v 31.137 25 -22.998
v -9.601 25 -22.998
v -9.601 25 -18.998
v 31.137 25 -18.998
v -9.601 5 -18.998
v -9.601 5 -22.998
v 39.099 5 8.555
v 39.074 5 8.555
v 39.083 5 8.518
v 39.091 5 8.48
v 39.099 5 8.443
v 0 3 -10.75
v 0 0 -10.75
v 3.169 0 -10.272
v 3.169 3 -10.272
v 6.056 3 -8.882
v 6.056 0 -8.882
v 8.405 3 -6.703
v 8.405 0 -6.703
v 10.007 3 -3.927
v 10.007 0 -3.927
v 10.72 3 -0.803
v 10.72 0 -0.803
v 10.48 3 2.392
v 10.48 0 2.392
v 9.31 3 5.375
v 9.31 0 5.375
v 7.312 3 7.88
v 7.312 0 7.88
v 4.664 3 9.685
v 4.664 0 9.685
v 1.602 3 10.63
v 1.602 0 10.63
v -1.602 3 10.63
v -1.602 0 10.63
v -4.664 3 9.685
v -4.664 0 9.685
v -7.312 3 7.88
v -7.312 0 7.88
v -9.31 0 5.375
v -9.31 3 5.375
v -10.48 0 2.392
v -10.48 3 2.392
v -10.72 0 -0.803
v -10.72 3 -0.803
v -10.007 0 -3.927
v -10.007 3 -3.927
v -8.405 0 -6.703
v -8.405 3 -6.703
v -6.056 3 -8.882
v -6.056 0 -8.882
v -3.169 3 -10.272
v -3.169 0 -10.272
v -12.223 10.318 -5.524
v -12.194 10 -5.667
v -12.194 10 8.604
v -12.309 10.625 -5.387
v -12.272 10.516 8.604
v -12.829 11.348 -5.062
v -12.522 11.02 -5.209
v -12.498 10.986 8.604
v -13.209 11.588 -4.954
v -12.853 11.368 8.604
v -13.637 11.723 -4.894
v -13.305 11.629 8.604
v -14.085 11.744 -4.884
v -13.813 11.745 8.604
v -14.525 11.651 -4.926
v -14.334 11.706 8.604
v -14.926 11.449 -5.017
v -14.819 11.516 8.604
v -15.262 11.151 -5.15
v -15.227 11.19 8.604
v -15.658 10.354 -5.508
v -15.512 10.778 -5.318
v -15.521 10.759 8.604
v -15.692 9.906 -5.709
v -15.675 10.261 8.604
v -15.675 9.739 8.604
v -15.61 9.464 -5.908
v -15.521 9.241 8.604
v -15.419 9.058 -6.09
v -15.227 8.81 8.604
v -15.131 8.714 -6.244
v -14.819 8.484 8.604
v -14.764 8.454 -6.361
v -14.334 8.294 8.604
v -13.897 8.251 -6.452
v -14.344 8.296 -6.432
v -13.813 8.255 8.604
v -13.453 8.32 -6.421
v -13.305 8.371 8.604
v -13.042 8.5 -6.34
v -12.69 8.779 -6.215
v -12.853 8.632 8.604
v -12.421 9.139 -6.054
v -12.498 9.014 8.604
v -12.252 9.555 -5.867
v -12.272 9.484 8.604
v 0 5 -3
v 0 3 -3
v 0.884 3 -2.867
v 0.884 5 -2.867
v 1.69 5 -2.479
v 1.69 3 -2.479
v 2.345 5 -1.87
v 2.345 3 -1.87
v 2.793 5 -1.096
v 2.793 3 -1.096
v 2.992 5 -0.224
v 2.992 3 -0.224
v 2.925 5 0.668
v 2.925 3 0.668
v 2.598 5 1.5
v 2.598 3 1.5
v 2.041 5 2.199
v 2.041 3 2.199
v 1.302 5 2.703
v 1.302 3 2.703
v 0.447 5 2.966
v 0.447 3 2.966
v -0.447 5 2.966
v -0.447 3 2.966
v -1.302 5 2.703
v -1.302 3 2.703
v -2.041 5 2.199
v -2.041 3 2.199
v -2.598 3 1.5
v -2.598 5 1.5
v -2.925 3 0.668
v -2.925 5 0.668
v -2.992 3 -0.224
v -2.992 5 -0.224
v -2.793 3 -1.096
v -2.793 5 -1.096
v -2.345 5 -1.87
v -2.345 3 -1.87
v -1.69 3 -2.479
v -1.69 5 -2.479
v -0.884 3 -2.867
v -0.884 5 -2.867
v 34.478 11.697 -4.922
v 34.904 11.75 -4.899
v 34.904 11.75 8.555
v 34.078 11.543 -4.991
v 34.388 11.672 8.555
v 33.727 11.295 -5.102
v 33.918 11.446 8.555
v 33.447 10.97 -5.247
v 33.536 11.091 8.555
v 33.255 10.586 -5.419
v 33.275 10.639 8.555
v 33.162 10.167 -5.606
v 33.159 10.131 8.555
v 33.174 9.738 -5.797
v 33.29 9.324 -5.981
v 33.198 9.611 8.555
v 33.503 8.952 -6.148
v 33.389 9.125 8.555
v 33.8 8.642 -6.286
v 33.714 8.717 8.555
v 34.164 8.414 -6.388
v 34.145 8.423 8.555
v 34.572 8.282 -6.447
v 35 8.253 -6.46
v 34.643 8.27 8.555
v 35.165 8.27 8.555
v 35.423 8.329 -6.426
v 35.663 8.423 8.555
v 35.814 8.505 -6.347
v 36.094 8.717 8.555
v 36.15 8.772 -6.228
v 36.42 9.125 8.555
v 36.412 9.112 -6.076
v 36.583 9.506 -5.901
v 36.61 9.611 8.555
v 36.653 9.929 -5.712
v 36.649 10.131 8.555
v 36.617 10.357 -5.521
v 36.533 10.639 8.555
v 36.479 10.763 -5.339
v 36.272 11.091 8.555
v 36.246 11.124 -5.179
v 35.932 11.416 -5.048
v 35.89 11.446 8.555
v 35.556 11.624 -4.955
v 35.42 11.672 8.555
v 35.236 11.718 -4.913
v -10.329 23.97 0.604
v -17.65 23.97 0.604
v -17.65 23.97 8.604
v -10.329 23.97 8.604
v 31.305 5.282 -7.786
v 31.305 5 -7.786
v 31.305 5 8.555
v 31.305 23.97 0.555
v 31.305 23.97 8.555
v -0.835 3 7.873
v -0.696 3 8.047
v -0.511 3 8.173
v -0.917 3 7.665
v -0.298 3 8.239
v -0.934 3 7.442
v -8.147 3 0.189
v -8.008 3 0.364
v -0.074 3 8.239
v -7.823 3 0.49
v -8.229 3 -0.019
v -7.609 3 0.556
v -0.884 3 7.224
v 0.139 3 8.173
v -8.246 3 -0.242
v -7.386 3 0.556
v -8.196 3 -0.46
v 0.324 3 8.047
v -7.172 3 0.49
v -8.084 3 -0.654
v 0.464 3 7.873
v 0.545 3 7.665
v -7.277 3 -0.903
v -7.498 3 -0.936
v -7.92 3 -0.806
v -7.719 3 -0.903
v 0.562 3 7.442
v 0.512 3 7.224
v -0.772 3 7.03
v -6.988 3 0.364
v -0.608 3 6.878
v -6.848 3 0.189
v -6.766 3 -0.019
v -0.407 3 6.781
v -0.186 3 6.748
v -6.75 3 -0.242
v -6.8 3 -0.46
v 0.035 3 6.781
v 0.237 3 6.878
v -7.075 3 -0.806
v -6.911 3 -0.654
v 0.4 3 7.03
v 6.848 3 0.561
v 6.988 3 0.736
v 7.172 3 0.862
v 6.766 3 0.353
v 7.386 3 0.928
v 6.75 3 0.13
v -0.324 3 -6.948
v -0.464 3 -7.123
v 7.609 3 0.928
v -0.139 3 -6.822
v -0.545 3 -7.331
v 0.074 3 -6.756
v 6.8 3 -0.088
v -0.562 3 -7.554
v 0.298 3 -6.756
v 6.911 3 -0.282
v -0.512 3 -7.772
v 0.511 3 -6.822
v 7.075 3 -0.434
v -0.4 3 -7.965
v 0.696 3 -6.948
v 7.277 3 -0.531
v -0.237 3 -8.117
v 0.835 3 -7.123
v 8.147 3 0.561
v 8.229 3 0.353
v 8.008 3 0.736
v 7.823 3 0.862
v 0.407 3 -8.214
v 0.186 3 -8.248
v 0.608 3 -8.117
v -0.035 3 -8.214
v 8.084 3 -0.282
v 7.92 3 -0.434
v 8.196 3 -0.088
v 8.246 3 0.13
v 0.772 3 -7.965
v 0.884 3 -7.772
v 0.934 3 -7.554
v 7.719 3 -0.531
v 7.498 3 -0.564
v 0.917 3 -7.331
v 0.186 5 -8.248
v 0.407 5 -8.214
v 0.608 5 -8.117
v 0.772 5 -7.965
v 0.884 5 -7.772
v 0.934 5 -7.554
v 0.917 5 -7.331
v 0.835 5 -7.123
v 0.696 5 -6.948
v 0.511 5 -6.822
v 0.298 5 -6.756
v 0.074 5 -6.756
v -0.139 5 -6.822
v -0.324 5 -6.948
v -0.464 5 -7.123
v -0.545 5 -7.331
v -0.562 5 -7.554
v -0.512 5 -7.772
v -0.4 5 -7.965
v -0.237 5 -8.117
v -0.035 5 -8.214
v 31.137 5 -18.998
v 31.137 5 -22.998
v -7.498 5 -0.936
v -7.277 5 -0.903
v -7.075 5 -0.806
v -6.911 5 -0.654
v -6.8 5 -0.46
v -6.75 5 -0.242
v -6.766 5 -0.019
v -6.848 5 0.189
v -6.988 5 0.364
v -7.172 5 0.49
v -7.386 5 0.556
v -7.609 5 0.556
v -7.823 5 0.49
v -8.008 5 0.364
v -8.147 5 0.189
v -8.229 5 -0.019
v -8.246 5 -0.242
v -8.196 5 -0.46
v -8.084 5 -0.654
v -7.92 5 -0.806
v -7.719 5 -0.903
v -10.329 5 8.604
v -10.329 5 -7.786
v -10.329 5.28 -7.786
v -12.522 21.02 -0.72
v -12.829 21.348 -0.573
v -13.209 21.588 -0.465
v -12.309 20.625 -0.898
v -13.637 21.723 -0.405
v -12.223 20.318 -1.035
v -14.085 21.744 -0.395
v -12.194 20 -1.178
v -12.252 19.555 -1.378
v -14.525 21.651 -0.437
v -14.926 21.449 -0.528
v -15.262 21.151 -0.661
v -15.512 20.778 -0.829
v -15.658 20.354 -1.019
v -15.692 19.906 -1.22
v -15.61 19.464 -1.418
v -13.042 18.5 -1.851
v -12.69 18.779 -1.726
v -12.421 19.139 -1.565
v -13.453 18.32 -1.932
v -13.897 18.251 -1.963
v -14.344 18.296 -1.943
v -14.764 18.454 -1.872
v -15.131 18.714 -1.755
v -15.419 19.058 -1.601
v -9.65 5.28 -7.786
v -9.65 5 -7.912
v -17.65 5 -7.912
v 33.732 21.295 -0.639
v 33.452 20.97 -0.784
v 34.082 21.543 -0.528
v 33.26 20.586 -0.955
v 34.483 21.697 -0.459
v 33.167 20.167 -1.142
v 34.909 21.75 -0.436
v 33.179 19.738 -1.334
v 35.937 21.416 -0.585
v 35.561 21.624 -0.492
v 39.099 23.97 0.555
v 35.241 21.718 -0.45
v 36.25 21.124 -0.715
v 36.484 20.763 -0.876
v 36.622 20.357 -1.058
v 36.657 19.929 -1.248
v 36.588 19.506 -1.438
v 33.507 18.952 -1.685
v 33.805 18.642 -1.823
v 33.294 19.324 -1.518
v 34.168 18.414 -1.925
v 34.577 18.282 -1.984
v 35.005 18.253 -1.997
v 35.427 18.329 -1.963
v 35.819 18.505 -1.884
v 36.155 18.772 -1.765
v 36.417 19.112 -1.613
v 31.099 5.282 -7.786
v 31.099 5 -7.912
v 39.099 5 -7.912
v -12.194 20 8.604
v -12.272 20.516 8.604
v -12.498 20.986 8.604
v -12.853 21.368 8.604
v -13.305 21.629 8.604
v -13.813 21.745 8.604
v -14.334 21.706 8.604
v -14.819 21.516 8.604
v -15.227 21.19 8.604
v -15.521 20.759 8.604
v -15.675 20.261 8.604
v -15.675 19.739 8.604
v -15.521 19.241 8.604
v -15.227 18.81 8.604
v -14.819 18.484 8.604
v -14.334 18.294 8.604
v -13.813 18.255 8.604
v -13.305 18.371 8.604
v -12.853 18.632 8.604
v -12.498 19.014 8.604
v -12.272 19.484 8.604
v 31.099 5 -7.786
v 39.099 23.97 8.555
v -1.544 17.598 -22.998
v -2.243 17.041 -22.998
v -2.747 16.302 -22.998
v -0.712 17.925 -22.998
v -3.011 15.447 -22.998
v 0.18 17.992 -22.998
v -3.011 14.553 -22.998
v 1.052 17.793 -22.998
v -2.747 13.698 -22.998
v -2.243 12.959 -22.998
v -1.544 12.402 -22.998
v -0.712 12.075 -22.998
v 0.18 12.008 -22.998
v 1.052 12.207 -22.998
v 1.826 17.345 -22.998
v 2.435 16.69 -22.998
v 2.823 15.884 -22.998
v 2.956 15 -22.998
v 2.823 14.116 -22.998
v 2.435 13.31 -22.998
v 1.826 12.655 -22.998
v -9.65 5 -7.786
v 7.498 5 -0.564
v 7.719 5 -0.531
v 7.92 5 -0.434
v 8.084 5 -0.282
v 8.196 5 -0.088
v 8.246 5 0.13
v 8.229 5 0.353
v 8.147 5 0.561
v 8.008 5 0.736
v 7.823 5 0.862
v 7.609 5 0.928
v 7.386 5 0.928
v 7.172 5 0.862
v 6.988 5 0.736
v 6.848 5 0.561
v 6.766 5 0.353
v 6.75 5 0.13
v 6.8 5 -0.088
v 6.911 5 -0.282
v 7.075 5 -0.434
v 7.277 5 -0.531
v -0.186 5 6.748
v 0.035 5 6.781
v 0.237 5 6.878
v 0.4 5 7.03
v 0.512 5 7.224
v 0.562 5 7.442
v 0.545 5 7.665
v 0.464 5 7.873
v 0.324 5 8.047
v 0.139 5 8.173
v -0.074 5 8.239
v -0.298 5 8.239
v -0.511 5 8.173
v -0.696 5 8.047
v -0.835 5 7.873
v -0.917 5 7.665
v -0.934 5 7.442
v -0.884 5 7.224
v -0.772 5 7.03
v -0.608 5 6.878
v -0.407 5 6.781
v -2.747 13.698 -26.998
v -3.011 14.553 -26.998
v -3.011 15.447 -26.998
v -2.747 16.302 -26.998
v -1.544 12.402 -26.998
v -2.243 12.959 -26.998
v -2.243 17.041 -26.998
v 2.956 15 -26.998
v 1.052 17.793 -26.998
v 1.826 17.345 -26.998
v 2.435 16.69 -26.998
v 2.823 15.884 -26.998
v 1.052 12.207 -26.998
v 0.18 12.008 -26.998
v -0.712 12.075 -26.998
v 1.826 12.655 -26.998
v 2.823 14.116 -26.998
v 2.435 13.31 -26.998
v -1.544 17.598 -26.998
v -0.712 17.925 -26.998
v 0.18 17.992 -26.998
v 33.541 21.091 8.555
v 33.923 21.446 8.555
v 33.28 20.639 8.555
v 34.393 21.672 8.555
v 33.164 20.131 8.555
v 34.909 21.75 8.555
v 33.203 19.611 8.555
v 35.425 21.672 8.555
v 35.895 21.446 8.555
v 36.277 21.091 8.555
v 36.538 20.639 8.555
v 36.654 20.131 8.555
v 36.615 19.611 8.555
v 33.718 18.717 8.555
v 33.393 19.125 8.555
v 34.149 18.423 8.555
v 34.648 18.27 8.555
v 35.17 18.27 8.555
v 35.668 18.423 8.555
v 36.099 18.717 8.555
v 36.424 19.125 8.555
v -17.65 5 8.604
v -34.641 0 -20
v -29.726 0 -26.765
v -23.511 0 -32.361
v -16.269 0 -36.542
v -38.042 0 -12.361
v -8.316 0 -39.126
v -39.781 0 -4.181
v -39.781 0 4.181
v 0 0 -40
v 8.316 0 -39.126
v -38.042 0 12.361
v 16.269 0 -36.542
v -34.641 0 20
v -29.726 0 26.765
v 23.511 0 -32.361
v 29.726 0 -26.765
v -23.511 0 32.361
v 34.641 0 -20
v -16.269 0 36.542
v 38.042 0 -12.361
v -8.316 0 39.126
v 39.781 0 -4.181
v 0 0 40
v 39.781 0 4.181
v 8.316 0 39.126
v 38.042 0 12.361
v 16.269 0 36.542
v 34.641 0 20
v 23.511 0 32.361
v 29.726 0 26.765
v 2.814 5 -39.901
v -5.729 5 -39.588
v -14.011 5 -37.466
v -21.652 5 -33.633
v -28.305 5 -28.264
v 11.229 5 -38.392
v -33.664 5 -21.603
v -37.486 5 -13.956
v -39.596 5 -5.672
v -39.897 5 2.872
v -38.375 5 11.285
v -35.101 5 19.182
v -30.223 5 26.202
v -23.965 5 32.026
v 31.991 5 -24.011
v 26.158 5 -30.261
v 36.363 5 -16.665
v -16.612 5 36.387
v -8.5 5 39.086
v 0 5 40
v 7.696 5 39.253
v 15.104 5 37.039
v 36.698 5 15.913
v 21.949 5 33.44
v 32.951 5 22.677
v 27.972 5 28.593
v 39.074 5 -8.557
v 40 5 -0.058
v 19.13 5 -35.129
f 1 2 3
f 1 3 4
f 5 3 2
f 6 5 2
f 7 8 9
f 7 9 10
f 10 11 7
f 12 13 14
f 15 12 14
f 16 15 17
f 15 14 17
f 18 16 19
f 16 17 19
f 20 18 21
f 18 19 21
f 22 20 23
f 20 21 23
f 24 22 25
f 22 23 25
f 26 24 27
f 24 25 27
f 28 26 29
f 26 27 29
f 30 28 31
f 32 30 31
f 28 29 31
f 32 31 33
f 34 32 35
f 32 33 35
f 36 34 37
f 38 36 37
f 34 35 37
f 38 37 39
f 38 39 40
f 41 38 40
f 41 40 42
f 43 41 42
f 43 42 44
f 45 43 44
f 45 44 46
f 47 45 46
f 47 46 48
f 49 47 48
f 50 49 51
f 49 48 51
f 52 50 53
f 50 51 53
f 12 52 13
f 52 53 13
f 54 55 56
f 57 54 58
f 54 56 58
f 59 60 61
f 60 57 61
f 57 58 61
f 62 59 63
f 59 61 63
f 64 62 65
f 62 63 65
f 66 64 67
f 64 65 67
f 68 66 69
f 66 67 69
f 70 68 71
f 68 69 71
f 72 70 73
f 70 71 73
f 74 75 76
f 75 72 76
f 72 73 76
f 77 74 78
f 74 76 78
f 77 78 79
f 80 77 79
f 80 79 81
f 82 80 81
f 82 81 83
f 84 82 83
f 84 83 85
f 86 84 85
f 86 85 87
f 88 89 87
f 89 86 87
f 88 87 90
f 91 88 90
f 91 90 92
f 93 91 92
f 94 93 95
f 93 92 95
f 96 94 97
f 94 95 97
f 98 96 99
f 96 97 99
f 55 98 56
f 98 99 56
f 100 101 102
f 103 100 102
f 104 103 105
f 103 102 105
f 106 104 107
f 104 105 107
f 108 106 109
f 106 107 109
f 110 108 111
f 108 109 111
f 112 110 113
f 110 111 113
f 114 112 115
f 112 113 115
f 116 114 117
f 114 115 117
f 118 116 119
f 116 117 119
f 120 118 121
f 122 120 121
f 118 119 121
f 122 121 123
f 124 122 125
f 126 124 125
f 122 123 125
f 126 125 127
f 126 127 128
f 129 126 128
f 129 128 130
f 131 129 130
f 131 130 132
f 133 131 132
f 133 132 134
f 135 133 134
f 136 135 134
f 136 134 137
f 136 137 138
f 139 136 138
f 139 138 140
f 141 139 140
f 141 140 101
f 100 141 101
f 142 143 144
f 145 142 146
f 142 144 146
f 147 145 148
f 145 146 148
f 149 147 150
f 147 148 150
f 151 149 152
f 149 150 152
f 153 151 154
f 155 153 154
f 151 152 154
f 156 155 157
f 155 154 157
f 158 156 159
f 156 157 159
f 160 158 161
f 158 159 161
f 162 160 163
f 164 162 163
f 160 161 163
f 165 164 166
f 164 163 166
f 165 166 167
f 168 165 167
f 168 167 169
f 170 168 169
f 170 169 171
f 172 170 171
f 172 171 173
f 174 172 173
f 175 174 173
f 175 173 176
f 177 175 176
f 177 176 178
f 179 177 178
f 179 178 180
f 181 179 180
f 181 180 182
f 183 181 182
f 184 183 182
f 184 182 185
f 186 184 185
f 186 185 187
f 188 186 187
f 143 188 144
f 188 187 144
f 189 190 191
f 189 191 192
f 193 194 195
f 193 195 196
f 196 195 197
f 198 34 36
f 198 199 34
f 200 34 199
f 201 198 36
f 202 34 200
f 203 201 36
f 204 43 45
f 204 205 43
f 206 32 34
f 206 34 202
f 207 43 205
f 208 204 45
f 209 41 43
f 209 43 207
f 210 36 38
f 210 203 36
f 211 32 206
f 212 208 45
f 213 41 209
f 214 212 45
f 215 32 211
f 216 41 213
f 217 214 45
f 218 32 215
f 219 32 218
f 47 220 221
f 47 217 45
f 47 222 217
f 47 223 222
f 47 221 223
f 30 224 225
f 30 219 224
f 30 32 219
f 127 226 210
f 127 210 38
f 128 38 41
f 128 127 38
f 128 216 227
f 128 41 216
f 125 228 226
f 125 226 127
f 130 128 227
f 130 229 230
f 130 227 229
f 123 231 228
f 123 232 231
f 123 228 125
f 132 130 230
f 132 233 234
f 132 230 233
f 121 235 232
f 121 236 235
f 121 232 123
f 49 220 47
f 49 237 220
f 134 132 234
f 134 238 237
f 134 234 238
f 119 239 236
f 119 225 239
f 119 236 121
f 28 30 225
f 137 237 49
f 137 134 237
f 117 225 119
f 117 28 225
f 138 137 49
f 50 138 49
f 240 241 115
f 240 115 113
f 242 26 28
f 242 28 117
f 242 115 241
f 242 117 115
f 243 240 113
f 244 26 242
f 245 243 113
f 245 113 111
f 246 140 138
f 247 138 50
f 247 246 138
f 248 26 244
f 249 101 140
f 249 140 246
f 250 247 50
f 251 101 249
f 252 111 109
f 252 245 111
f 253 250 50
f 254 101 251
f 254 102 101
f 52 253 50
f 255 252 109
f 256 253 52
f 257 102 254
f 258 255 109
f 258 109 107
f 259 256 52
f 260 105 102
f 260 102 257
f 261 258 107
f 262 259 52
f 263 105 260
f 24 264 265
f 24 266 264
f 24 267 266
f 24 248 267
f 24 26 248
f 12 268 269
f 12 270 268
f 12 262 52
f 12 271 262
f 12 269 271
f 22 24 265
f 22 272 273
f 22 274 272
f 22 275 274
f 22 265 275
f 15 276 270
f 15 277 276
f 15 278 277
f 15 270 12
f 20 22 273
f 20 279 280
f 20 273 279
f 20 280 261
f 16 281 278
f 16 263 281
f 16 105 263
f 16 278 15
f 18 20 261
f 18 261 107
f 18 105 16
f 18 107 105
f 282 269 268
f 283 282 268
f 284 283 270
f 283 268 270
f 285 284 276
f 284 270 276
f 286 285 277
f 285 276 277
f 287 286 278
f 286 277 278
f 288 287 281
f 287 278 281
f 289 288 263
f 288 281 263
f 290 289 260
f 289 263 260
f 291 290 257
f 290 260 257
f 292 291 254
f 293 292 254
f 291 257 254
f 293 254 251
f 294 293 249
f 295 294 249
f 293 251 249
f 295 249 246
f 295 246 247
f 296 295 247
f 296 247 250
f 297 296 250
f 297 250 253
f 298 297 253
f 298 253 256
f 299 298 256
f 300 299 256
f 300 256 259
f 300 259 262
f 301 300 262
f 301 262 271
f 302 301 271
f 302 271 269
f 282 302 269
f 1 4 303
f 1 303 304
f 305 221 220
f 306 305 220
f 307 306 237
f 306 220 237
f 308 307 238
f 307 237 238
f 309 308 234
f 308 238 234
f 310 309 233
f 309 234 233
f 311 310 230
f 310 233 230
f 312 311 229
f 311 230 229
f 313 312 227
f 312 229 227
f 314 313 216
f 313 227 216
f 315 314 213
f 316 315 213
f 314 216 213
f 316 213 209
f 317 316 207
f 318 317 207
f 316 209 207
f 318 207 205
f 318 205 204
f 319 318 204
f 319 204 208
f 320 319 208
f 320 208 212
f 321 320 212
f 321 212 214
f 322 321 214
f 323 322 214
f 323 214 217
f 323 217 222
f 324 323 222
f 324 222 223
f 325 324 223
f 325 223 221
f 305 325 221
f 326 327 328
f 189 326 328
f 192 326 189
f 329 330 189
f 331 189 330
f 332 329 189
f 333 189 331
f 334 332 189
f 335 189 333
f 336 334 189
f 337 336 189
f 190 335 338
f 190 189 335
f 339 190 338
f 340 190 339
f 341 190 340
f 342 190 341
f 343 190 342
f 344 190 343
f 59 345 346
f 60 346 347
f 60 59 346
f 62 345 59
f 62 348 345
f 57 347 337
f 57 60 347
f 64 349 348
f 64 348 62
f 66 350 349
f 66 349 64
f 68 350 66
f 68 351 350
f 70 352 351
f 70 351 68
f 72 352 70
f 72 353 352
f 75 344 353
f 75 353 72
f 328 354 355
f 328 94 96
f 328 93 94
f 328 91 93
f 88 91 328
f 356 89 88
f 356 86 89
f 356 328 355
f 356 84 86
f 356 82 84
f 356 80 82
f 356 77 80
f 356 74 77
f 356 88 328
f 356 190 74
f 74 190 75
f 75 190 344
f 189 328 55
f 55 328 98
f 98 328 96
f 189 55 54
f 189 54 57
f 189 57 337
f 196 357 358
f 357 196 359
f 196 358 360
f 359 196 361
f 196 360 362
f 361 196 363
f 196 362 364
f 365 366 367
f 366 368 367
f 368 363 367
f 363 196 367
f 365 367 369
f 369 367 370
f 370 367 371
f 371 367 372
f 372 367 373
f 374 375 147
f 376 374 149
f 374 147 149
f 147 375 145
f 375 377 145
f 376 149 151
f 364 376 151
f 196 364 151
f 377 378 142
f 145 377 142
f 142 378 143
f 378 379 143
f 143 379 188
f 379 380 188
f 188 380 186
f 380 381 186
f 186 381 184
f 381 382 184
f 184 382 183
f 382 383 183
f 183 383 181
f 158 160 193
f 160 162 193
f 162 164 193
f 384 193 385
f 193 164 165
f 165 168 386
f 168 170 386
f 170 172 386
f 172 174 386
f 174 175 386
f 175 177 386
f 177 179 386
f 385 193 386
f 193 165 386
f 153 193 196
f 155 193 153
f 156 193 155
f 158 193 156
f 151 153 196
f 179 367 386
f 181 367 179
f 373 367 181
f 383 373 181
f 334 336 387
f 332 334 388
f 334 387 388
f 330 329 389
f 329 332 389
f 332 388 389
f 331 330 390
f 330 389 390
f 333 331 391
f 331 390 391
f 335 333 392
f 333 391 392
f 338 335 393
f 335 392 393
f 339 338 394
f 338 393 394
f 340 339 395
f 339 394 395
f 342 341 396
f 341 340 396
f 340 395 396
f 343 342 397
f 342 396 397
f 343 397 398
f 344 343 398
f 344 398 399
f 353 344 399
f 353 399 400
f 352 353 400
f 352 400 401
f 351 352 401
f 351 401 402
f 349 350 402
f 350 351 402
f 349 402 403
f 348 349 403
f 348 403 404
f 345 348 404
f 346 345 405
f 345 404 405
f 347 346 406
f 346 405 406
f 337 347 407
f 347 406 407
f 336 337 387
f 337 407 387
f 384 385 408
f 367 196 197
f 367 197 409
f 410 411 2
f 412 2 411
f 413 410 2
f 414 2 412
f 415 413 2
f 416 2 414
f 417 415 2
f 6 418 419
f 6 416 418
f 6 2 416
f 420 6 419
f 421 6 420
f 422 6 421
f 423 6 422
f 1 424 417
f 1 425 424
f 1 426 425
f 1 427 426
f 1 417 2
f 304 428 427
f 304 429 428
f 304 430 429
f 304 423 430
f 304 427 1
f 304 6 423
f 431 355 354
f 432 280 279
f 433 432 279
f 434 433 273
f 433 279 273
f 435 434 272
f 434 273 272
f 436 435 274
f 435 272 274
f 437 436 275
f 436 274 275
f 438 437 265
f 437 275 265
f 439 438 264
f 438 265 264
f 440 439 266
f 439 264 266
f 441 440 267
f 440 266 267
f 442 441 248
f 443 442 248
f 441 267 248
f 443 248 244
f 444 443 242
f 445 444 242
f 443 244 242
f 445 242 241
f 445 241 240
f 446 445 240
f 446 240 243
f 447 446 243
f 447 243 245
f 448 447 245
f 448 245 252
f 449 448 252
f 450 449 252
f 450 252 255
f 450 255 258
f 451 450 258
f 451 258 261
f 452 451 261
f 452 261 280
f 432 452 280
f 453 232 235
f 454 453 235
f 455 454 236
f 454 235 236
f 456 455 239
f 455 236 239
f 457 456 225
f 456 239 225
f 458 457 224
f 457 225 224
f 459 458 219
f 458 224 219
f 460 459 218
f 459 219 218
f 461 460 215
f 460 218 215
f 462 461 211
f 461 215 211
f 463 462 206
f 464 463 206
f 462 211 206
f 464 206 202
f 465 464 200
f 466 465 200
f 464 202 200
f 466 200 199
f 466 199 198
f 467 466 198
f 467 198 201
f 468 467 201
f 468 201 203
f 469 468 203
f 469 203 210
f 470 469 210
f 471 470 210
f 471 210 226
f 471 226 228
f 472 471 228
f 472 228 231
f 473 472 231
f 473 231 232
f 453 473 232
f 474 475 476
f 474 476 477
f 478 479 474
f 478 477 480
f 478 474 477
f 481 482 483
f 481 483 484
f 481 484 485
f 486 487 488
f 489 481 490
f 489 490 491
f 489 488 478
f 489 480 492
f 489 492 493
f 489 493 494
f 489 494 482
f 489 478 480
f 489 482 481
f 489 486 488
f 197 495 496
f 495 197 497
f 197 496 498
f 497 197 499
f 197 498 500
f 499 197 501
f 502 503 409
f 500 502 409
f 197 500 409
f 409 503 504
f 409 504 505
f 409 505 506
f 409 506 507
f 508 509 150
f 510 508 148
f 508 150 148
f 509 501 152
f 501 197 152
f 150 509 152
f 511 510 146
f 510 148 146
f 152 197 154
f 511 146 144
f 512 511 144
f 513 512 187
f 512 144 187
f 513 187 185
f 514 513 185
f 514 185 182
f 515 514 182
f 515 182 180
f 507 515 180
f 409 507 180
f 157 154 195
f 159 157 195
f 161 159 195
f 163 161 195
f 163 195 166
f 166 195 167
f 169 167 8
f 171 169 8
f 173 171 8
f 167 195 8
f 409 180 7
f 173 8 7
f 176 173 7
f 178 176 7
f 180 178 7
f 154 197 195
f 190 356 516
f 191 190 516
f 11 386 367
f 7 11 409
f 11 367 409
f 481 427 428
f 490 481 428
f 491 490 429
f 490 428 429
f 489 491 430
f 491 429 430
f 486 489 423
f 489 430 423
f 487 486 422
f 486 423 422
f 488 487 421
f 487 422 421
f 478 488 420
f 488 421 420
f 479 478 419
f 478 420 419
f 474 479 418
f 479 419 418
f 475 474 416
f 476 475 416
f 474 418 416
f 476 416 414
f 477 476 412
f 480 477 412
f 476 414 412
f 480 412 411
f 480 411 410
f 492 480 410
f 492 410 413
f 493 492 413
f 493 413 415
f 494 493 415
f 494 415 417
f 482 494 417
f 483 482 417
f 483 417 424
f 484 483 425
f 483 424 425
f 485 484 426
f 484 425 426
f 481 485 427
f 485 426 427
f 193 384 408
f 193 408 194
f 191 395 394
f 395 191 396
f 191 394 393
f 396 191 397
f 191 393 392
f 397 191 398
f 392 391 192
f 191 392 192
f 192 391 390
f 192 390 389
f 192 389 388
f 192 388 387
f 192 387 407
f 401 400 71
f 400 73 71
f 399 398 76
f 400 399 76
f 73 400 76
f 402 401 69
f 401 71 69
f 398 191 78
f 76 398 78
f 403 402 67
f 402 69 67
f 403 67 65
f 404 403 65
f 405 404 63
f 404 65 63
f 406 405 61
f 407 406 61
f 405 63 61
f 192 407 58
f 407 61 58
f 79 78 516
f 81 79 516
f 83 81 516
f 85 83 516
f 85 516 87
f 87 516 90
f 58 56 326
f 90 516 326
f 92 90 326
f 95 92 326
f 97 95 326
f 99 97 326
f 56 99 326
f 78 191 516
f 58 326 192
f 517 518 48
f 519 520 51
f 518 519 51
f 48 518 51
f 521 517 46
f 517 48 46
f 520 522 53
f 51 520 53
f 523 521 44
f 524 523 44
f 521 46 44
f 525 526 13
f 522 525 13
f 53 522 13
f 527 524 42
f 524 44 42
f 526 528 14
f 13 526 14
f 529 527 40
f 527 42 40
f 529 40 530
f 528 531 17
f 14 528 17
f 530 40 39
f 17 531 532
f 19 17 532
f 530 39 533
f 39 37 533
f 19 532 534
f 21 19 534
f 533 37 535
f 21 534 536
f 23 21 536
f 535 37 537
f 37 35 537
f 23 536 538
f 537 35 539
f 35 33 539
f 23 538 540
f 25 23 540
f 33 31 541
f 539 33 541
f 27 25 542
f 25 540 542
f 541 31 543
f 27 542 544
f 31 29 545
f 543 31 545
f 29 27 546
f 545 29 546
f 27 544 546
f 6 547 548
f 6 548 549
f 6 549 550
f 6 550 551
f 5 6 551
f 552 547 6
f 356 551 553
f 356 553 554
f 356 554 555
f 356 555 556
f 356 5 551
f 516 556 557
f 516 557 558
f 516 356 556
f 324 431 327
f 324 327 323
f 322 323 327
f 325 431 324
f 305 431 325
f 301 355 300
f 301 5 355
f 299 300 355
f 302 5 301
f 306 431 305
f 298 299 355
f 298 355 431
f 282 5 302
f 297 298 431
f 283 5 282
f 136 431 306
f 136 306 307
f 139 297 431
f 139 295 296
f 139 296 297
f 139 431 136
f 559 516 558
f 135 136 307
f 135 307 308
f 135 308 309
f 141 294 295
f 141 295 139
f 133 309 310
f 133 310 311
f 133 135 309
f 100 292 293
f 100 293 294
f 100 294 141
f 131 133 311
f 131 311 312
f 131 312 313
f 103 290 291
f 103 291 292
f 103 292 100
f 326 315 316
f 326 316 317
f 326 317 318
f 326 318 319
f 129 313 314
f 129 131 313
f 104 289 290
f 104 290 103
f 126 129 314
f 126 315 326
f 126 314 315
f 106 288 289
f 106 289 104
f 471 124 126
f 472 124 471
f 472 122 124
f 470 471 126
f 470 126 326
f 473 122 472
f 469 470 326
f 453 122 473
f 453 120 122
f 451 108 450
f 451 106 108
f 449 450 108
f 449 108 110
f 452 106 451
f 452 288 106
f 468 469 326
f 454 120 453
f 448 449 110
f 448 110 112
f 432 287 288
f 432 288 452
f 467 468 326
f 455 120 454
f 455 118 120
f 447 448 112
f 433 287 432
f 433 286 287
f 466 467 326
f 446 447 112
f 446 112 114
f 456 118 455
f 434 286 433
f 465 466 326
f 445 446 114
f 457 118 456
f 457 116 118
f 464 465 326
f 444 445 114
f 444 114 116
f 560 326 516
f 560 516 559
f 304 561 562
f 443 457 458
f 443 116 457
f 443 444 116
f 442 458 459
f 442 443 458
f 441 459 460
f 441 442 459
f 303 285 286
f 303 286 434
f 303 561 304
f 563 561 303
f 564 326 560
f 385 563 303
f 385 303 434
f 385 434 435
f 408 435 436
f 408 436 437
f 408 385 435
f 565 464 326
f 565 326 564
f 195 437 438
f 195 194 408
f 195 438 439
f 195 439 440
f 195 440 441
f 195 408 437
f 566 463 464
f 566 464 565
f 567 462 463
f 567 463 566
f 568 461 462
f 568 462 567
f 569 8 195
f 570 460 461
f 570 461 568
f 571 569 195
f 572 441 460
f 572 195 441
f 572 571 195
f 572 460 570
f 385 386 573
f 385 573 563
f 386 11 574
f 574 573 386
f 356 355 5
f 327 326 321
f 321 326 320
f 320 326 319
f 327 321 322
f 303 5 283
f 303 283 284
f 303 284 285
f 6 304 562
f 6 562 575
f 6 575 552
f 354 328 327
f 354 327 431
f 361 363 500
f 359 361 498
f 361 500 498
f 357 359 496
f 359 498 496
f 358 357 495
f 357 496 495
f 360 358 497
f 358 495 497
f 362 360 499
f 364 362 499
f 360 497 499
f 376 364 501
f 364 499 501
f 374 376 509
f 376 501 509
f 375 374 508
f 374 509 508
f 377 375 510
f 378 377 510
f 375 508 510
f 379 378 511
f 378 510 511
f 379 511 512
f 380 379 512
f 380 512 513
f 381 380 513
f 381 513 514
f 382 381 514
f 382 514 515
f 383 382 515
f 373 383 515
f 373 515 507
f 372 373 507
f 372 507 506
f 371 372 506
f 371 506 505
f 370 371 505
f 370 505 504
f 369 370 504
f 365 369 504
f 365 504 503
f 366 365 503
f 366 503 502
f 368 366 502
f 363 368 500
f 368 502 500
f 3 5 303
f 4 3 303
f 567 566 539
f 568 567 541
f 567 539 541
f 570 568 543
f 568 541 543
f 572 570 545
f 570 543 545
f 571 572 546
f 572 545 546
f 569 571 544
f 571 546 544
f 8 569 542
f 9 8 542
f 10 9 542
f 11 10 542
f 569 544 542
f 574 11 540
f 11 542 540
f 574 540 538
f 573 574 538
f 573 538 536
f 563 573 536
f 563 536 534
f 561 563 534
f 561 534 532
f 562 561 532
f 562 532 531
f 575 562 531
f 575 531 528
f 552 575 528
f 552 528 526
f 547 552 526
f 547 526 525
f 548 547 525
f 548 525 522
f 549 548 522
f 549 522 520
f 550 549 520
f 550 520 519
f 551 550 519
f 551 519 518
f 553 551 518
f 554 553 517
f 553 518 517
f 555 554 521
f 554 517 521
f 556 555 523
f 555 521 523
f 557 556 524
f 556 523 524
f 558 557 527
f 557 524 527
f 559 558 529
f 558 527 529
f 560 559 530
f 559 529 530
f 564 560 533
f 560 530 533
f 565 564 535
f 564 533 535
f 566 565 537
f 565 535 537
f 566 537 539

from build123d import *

# Parameters (mm, degrees)
SKIZZE1_R                       = 40
AUFSATZ_LINEAR_AUSTRAGEN1_DEPTH = 5
SKIZZE2_R                       = 10.75
SCHNITT_LINEAR_AUSTRAGEN1_DEPTH = 3
SKIZZE3_R                       = 3
SKIZZE3_R_2                     = 0.75
SCHNITT_LINEAR_AUSTRAGEN2_DEPTH = 13
SKIZZE4_W                       = 8
SKIZZE4_H                       = 8
AUFSATZ_LINEAR_AUSTRAGEN2_DEPTH = 18.97
AUFSATZ_LINEAR_AUSTRAGEN3_DEPTH = 8
AUFSATZ_LINEAR_AUSTRAGEN4_DEPTH = 8
SKIZZE7_R                       = 1.75
SCHNITT_LINEAR_AUSTRAGEN3_DEPTH = 33.27
SKIZZE9_W                       = 40.738044429
SKIZZE9_H                       = 4
AUFSATZ_LINEAR_AUSTRAGEN5_DEPTH = 20
SKIZZE10_R                      = 3
AUFSATZ_LINEAR_AUSTRAGEN6_DEPTH = 4
SKIZZE11_W                      = 0.727428481
SKIZZE11_H                      = 19.15
SKIZZE11_W_2                    = 0.206337284
SCHNITT_LINEAR_AUSTRAGEN4_DEPTH = 16.39


with BuildPart() as part:
    # Skizze1 → Aufsatz-Linear austragen1 (new body)
    with BuildSketch(Plane(origin=(0, 0, 0), x_dir=(1, 0, 0), z_dir=(0, 1, 0))):
        with Locations(Location((0, 0, 0), (0, 0, 270))):
            Circle(SKIZZE1_R)
    extrude(amount=AUFSATZ_LINEAR_AUSTRAGEN1_DEPTH)

    # Skizze2 → Schnitt-Linear austragen1 (cut)
    with BuildSketch(Plane.XZ):
        with Locations(Location((0, 0, 0), (0, 0, 270))):
            Circle(SKIZZE2_R)
    extrude(amount=-SCHNITT_LINEAR_AUSTRAGEN1_DEPTH, mode=Mode.SUBTRACT)

    # Skizze3 → Schnitt-Linear austragen2 (cut)
    with BuildSketch(Plane.XZ):
        with Locations(Location((0, 0, 0), (0, 0, 270))):
            Circle(SKIZZE3_R)
        with Locations(Location((-0.185951444, 7.49769445, 0), (0, 0, 270))):
            Circle(SKIZZE3_R_2)
        with Locations(Location((7.49769445, 0.185951444, 0), (0, 0, 270))):
            Circle(SKIZZE3_R_2)
        with Locations(Location((0.185951444, -7.49769445, 0), (0, 0, 270))):
            Circle(SKIZZE3_R_2)
        with Locations(Location((-7.49769445, -0.185951444, 0), (0, 0, 270))):
            Circle(SKIZZE3_R_2)
    extrude(amount=-SCHNITT_LINEAR_AUSTRAGEN2_DEPTH, mode=Mode.SUBTRACT)

    # Skizze4 → Aufsatz-Linear austragen2 (add)
    with BuildSketch(Plane(origin=(0, 5, 0), x_dir=(1, 0, 0), z_dir=(0, 1, 0))):
        with Locations((-13.649547585, -4.604184577)):
            Rectangle(SKIZZE4_W, SKIZZE4_H)
        with Locations((35.098787181, -4.555000776)):
            Rectangle(SKIZZE4_W, SKIZZE4_H)
    extrude(amount=AUFSATZ_LINEAR_AUSTRAGEN2_DEPTH)

    # Skizze5 → Aufsatz-Linear austragen3 (add)
    with BuildSketch(Plane(origin=(39.098787181, 0, 0), x_dir=(0, 0, -1), z_dir=(1, 0, 0))):
        Polygon((-0.555000776, 23.97), (7.911534589, 5), (-0.555000776, 5), align=None)
    extrude(amount=-AUFSATZ_LINEAR_AUSTRAGEN3_DEPTH)

    # Skizze6 → Aufsatz-Linear austragen4 (add)
    with BuildSketch(Plane.ZY.offset(17.649547585)):
        Polygon((0.604184577, 23.97), (-7.911534589, 5), (0.604184577, 5), align=None)
    extrude(amount=-AUFSATZ_LINEAR_AUSTRAGEN4_DEPTH)

    # Skizze7 → Schnitt-Linear austragen3 (cut)
    with BuildSketch(Plane.XY.offset(8.604184577)):
        with Locations((-13.944175516, 20)):
            Circle(SKIZZE7_R)
        with Locations((-13.944175516, 10)):
            Circle(SKIZZE7_R)
        with Locations(Location((34.90415925, 10, 0), (0, 0, 90))):
            Circle(SKIZZE7_R)
        with Locations(Location((34.908787181, 20, 0), (0, 0, 90))):
            Circle(SKIZZE7_R)
    extrude(amount=-SCHNITT_LINEAR_AUSTRAGEN3_DEPTH, mode=Mode.SUBTRACT)

    # Skizze9 → Aufsatz-Linear austragen5 (add)
    with BuildSketch(Plane(origin=(0, 5, 0), x_dir=(1, 0, 0), z_dir=(0, 1, 0))):
        with Locations((10.767809396, 20.99827279)):
            Rectangle(SKIZZE9_W, SKIZZE9_H)
    extrude(amount=AUFSATZ_LINEAR_AUSTRAGEN5_DEPTH)

    # Skizze10 → Aufsatz-Linear austragen6 (add)
    with BuildSketch(Plane(origin=(0, 0, -22.99827279), x_dir=(-1, 0, 0), z_dir=(0, 0, -1))):
        with Locations(Location((0.044175516, 15, 0), (0, 0, 180))):
            Circle(SKIZZE10_R)
    extrude(amount=AUFSATZ_LINEAR_AUSTRAGEN6_DEPTH)

    # Skizze11 → Schnitt-Linear austragen4 (cut)
    with BuildSketch(Plane.XY.offset(8.604184577)):
        with Locations((-9.96492706, 14.575)):
            Rectangle(SKIZZE11_W, SKIZZE11_H)
        with Locations((31.201955823, 14.575)):
            Rectangle(SKIZZE11_W_2, SKIZZE11_H)
    extrude(amount=-SCHNITT_LINEAR_AUSTRAGEN4_DEPTH, mode=Mode.SUBTRACT)


solid = part.part
